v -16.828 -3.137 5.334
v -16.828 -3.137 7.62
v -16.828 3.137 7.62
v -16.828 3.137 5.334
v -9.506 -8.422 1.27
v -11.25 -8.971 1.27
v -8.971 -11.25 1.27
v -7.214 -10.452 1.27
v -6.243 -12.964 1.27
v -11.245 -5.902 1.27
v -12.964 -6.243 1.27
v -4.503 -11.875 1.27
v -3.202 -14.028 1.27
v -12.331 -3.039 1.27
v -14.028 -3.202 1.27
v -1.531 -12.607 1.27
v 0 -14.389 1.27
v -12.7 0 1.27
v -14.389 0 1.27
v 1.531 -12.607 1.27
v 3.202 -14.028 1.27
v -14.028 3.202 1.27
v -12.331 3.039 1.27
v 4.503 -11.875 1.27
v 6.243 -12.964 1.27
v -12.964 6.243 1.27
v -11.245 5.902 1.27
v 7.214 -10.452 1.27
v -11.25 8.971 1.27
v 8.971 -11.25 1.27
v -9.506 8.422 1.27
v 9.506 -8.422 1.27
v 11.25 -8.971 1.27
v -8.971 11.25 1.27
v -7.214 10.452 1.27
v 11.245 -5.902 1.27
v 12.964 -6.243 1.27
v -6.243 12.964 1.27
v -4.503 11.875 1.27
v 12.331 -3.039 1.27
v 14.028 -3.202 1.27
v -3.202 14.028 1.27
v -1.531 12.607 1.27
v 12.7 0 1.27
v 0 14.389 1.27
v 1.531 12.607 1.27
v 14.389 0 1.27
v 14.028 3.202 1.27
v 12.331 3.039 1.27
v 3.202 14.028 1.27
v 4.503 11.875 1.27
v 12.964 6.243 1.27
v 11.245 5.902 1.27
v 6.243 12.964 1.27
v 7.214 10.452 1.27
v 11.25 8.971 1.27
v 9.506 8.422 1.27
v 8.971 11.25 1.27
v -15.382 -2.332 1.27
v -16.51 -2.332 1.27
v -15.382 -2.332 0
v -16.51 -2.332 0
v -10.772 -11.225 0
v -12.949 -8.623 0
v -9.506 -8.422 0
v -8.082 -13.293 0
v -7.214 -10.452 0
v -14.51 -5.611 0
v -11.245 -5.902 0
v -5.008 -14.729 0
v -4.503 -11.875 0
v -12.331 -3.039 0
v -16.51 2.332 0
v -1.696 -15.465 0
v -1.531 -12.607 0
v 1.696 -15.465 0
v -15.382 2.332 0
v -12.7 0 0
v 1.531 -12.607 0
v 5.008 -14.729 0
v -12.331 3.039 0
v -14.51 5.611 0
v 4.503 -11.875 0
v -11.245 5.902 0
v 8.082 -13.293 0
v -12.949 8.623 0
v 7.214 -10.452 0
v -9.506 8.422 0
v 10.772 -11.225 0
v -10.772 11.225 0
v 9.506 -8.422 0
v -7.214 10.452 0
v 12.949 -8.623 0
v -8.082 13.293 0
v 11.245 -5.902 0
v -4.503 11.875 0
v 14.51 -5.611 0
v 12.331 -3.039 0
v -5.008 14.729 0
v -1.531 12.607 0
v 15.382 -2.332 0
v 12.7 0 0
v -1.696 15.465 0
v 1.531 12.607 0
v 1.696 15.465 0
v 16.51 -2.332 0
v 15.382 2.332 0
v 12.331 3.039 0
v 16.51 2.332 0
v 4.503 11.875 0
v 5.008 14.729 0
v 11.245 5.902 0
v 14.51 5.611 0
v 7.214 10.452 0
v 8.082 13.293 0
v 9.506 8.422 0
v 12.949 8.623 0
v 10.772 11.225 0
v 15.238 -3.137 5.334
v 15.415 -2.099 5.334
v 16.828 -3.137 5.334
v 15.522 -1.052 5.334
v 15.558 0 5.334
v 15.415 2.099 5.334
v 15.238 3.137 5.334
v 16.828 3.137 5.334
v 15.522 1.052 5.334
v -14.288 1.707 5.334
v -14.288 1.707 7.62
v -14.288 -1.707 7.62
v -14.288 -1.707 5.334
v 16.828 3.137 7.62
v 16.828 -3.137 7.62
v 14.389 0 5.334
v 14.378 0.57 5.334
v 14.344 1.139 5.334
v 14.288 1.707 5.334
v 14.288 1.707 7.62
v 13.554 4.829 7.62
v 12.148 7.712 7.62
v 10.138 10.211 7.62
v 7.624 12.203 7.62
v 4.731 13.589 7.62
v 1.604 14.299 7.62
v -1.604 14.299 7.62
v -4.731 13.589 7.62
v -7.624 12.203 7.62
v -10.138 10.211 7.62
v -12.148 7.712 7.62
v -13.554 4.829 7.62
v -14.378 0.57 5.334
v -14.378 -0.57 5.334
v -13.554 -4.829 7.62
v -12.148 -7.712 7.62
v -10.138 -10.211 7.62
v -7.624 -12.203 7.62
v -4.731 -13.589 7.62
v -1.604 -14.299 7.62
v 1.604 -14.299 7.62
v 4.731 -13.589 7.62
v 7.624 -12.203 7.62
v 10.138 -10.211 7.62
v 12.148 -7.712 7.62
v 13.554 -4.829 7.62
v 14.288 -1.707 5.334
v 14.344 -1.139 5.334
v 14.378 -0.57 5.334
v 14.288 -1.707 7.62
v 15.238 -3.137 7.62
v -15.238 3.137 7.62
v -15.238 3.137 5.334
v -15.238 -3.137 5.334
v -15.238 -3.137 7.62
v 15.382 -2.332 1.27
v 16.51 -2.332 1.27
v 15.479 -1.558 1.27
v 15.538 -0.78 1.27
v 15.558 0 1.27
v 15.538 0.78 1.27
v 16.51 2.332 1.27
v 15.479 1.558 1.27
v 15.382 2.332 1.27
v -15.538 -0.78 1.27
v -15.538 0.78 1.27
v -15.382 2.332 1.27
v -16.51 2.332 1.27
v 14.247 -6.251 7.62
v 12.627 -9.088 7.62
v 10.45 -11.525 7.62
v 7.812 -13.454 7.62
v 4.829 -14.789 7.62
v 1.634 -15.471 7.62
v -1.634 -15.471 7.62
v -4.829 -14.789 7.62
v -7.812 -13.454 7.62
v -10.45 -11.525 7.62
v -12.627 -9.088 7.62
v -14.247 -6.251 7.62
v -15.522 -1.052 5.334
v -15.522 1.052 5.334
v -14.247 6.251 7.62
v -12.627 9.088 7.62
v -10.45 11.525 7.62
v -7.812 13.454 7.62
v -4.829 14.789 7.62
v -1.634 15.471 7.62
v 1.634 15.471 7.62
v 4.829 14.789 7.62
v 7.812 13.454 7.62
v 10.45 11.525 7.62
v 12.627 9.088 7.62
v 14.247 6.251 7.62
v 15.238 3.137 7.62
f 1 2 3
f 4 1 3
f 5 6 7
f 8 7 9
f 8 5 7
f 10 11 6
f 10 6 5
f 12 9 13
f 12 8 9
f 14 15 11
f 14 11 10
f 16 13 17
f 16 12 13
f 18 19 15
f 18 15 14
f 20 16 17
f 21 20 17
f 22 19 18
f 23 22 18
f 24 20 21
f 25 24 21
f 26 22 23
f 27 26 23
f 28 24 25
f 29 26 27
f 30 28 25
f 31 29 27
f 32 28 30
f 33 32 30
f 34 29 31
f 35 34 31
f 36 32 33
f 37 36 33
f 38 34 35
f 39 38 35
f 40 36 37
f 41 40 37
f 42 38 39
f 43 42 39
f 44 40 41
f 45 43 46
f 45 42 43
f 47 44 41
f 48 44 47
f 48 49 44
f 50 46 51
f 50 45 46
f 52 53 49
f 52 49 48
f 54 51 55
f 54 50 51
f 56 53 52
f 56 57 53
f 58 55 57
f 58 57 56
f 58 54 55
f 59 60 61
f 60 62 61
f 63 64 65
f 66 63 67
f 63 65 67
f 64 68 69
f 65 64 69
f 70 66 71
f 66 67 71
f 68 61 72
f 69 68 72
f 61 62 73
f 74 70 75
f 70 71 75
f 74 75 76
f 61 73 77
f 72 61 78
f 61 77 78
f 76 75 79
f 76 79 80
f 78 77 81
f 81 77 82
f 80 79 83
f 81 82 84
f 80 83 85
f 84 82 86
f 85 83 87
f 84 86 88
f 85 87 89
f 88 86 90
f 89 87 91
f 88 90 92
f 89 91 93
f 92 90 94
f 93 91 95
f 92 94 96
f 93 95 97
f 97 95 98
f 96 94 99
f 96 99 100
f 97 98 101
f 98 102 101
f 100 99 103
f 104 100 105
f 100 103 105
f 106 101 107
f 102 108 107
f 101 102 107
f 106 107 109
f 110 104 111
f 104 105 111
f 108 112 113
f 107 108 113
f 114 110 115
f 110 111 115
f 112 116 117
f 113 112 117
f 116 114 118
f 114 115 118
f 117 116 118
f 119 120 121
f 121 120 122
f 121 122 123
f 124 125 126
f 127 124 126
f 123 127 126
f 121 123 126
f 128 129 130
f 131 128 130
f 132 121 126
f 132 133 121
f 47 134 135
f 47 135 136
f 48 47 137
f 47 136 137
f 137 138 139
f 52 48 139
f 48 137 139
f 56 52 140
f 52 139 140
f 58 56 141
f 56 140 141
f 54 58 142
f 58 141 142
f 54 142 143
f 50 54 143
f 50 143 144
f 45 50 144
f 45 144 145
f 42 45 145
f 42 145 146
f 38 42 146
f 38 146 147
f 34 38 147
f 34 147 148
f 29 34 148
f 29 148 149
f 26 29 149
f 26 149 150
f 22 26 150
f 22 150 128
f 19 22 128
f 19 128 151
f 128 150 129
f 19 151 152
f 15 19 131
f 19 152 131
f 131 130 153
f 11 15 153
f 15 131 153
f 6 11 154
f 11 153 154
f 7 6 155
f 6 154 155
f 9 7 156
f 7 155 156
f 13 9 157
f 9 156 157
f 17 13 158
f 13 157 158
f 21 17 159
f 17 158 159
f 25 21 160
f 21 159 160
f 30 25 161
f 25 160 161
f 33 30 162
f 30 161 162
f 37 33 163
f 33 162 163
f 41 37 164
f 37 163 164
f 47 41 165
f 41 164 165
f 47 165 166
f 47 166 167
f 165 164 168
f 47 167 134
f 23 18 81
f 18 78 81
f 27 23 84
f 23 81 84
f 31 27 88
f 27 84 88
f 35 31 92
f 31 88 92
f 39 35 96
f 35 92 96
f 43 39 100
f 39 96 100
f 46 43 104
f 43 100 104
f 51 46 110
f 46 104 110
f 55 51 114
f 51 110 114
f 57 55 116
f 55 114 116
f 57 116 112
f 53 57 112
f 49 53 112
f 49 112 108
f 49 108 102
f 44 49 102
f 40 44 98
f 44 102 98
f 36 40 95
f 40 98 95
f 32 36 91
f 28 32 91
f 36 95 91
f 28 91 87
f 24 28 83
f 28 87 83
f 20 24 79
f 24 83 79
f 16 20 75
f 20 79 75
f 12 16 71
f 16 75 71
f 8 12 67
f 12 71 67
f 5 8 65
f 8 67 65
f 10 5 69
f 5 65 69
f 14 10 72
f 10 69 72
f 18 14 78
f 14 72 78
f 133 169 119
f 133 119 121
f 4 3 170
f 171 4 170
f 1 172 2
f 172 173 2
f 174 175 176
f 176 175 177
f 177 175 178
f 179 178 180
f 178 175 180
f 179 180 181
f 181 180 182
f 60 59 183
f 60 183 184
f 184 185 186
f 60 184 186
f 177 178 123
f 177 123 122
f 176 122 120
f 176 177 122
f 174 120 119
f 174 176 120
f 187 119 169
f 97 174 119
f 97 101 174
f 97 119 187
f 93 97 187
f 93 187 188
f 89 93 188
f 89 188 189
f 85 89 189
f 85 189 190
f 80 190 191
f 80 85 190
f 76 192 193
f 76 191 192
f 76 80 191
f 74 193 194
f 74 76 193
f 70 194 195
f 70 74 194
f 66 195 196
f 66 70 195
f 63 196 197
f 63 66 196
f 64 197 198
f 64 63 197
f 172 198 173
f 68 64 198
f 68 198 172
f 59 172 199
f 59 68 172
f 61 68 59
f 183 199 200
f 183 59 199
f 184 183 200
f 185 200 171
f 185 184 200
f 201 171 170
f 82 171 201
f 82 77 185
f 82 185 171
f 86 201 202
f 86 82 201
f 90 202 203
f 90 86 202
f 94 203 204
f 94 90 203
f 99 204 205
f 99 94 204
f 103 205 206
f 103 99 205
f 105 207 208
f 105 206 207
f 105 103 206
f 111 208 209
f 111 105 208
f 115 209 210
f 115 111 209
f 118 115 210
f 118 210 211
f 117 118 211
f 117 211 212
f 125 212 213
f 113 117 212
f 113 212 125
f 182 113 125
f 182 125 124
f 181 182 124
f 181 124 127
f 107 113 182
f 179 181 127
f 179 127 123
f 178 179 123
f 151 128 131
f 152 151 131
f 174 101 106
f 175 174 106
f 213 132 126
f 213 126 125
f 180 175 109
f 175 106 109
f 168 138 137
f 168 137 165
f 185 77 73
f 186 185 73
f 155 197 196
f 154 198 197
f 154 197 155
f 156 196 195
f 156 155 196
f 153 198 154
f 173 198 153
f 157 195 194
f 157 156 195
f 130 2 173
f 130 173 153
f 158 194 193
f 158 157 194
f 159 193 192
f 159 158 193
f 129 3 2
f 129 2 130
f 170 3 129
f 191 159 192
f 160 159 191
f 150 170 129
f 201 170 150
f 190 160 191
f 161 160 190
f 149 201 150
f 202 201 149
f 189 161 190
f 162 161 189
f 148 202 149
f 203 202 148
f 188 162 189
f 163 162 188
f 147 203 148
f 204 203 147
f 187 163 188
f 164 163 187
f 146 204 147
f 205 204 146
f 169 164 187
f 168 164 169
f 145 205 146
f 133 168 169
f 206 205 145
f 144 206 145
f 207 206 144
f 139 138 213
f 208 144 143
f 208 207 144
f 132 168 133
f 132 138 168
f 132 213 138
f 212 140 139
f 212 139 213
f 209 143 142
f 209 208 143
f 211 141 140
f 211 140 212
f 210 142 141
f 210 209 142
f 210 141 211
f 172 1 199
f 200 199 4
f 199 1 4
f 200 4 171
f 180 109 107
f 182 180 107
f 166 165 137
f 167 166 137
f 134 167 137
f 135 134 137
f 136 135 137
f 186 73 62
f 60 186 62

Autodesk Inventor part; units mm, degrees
ref_plane "YZ Plane" through (0, 0, 0) normal (1, 0, 0) x (0, 1, 0)
ref_plane "XZ Plane" through (0, 0, 0) normal (0, 1, 0) x (-1, 0, 0)
ref_plane "XY Plane" through (0, 0, 0) normal (0, 0, 1) x (1, 0, 0)
sketch "Sketch1" plane through (0, 0, 0) normal (0, 0, 1) x (1, 0, 0)
  circle A0 centre (0, 0) radius 15.5575
  dimension "d0" = 31.115
extrude "Extrusion1" add sketch "Sketch1" along normal blind 7.62
sketch "Sketch2" plane through (0, 0, 7.62) normal (0, 0, 1) x (1, 0, 0)
  circle A0 centre (0, 0) radius 14.3891
  dimension "d16" = 28.7782
extrude "Extrusion2" cut sketch "Sketch2" against normal blind 6.35
sketch "Sketch3" plane through (0, 0, 0) normal (0, 0, -1) x (-1, 0, 0)
  circle A0 centre (0, 0) radius 12.7
  dimension "d15" = 25.4
extrude "Extrusion3" cut sketch "Sketch3" against normal blind 5.08
sketch "Sketch4" plane through (0, 0, 7.62) normal (0, 0, 1) x (1, 0, 0)
  line L0 (-14.2875, -3.1369) -> (-16.8275, -3.1369)
  line L1 (-16.8275, -3.1369) -> (-16.8275, 3.1369)
  line L2 (-16.8275, 3.1369) -> (-14.2875, 3.1369)
  line L3 (-14.2875, 3.1369) -> (-14.2875, -3.1369)
  circle A0 centre (0, 0) radius 15.5575 projected
  line L4 (-14.2875, -3.1369) -> (-16.8275, 3.1369) construction
  line L5 (-16.8275, -3.1369) -> (-14.2875, 3.1369) construction
  line L6 (14.2875, -3.1369) -> (16.8275, -3.1369)
  line L7 (16.8275, -3.1369) -> (16.8275, 3.1369)
  line L8 (16.8275, 3.1369) -> (14.2875, 3.1369)
  line L9 (14.2875, 3.1369) -> (14.2875, -3.1369)
  line L10 (14.2875, -3.1369) -> (16.8275, 3.1369) construction
  line L11 (16.8275, -3.1369) -> (14.2875, 3.1369) construction
  point P0 (-15.5575, 0)
  point P1 (15.5575, 0)
  dimension "d7" = 2.54
  dimension "d8" = 6.2738
  dimension "d9" = 2.54
  dimension "d10" = 6.2738
extrude "Extrusion5" add sketch "Sketch4" against normal blind 2.286 contours L0 A0 L2 L3 | L0 L1 L2 A0 | L6 L9 L8 A0 | A0 L8 L7 L6
sketch "Sketch5" plane through (0, 0, 0) normal (0, 0, -1) x (-1, 0, 0)
  line L0 (13.97, 2.3319) -> (16.51, 2.3319)
  line L1 (16.51, 2.3319) -> (16.51, -2.3319)
  line L2 (16.51, -2.3319) -> (13.97, -2.3319)
  line L3 (13.97, -2.3319) -> (13.97, 2.3319)
  line L4 (13.97, 2.3319) -> (16.51, -2.3319) construction
  line L5 (16.51, 2.3319) -> (13.97, -2.3319) construction
  line L6 (-16.51, 2.3319) -> (-13.97, 2.3319)
  line L7 (-13.97, 2.3319) -> (-13.97, -2.3319)
  line L8 (-13.97, -2.3319) -> (-16.51, -2.3319)
  line L9 (-16.51, -2.3319) -> (-16.51, 2.3319)
  line L10 (-16.51, 2.3319) -> (-13.97, -2.3319) construction
  line L11 (-13.97, 2.3319) -> (-16.51, -2.3319) construction
  point P0 (0, 0)
  point P1 (15.24, 0)
  point P2 (-15.24, 0)
  dimension "d17" = 2.54
  dimension "d18" = 2.54
  dimension "d19" = 15.24
  dimension "d20" = 15.24
extrude "Extrusion6" add sketch "Sketch5" against normal blind 1.27
equation "\"d20\" = d19"
properties part number "GelCupHolderTop"
